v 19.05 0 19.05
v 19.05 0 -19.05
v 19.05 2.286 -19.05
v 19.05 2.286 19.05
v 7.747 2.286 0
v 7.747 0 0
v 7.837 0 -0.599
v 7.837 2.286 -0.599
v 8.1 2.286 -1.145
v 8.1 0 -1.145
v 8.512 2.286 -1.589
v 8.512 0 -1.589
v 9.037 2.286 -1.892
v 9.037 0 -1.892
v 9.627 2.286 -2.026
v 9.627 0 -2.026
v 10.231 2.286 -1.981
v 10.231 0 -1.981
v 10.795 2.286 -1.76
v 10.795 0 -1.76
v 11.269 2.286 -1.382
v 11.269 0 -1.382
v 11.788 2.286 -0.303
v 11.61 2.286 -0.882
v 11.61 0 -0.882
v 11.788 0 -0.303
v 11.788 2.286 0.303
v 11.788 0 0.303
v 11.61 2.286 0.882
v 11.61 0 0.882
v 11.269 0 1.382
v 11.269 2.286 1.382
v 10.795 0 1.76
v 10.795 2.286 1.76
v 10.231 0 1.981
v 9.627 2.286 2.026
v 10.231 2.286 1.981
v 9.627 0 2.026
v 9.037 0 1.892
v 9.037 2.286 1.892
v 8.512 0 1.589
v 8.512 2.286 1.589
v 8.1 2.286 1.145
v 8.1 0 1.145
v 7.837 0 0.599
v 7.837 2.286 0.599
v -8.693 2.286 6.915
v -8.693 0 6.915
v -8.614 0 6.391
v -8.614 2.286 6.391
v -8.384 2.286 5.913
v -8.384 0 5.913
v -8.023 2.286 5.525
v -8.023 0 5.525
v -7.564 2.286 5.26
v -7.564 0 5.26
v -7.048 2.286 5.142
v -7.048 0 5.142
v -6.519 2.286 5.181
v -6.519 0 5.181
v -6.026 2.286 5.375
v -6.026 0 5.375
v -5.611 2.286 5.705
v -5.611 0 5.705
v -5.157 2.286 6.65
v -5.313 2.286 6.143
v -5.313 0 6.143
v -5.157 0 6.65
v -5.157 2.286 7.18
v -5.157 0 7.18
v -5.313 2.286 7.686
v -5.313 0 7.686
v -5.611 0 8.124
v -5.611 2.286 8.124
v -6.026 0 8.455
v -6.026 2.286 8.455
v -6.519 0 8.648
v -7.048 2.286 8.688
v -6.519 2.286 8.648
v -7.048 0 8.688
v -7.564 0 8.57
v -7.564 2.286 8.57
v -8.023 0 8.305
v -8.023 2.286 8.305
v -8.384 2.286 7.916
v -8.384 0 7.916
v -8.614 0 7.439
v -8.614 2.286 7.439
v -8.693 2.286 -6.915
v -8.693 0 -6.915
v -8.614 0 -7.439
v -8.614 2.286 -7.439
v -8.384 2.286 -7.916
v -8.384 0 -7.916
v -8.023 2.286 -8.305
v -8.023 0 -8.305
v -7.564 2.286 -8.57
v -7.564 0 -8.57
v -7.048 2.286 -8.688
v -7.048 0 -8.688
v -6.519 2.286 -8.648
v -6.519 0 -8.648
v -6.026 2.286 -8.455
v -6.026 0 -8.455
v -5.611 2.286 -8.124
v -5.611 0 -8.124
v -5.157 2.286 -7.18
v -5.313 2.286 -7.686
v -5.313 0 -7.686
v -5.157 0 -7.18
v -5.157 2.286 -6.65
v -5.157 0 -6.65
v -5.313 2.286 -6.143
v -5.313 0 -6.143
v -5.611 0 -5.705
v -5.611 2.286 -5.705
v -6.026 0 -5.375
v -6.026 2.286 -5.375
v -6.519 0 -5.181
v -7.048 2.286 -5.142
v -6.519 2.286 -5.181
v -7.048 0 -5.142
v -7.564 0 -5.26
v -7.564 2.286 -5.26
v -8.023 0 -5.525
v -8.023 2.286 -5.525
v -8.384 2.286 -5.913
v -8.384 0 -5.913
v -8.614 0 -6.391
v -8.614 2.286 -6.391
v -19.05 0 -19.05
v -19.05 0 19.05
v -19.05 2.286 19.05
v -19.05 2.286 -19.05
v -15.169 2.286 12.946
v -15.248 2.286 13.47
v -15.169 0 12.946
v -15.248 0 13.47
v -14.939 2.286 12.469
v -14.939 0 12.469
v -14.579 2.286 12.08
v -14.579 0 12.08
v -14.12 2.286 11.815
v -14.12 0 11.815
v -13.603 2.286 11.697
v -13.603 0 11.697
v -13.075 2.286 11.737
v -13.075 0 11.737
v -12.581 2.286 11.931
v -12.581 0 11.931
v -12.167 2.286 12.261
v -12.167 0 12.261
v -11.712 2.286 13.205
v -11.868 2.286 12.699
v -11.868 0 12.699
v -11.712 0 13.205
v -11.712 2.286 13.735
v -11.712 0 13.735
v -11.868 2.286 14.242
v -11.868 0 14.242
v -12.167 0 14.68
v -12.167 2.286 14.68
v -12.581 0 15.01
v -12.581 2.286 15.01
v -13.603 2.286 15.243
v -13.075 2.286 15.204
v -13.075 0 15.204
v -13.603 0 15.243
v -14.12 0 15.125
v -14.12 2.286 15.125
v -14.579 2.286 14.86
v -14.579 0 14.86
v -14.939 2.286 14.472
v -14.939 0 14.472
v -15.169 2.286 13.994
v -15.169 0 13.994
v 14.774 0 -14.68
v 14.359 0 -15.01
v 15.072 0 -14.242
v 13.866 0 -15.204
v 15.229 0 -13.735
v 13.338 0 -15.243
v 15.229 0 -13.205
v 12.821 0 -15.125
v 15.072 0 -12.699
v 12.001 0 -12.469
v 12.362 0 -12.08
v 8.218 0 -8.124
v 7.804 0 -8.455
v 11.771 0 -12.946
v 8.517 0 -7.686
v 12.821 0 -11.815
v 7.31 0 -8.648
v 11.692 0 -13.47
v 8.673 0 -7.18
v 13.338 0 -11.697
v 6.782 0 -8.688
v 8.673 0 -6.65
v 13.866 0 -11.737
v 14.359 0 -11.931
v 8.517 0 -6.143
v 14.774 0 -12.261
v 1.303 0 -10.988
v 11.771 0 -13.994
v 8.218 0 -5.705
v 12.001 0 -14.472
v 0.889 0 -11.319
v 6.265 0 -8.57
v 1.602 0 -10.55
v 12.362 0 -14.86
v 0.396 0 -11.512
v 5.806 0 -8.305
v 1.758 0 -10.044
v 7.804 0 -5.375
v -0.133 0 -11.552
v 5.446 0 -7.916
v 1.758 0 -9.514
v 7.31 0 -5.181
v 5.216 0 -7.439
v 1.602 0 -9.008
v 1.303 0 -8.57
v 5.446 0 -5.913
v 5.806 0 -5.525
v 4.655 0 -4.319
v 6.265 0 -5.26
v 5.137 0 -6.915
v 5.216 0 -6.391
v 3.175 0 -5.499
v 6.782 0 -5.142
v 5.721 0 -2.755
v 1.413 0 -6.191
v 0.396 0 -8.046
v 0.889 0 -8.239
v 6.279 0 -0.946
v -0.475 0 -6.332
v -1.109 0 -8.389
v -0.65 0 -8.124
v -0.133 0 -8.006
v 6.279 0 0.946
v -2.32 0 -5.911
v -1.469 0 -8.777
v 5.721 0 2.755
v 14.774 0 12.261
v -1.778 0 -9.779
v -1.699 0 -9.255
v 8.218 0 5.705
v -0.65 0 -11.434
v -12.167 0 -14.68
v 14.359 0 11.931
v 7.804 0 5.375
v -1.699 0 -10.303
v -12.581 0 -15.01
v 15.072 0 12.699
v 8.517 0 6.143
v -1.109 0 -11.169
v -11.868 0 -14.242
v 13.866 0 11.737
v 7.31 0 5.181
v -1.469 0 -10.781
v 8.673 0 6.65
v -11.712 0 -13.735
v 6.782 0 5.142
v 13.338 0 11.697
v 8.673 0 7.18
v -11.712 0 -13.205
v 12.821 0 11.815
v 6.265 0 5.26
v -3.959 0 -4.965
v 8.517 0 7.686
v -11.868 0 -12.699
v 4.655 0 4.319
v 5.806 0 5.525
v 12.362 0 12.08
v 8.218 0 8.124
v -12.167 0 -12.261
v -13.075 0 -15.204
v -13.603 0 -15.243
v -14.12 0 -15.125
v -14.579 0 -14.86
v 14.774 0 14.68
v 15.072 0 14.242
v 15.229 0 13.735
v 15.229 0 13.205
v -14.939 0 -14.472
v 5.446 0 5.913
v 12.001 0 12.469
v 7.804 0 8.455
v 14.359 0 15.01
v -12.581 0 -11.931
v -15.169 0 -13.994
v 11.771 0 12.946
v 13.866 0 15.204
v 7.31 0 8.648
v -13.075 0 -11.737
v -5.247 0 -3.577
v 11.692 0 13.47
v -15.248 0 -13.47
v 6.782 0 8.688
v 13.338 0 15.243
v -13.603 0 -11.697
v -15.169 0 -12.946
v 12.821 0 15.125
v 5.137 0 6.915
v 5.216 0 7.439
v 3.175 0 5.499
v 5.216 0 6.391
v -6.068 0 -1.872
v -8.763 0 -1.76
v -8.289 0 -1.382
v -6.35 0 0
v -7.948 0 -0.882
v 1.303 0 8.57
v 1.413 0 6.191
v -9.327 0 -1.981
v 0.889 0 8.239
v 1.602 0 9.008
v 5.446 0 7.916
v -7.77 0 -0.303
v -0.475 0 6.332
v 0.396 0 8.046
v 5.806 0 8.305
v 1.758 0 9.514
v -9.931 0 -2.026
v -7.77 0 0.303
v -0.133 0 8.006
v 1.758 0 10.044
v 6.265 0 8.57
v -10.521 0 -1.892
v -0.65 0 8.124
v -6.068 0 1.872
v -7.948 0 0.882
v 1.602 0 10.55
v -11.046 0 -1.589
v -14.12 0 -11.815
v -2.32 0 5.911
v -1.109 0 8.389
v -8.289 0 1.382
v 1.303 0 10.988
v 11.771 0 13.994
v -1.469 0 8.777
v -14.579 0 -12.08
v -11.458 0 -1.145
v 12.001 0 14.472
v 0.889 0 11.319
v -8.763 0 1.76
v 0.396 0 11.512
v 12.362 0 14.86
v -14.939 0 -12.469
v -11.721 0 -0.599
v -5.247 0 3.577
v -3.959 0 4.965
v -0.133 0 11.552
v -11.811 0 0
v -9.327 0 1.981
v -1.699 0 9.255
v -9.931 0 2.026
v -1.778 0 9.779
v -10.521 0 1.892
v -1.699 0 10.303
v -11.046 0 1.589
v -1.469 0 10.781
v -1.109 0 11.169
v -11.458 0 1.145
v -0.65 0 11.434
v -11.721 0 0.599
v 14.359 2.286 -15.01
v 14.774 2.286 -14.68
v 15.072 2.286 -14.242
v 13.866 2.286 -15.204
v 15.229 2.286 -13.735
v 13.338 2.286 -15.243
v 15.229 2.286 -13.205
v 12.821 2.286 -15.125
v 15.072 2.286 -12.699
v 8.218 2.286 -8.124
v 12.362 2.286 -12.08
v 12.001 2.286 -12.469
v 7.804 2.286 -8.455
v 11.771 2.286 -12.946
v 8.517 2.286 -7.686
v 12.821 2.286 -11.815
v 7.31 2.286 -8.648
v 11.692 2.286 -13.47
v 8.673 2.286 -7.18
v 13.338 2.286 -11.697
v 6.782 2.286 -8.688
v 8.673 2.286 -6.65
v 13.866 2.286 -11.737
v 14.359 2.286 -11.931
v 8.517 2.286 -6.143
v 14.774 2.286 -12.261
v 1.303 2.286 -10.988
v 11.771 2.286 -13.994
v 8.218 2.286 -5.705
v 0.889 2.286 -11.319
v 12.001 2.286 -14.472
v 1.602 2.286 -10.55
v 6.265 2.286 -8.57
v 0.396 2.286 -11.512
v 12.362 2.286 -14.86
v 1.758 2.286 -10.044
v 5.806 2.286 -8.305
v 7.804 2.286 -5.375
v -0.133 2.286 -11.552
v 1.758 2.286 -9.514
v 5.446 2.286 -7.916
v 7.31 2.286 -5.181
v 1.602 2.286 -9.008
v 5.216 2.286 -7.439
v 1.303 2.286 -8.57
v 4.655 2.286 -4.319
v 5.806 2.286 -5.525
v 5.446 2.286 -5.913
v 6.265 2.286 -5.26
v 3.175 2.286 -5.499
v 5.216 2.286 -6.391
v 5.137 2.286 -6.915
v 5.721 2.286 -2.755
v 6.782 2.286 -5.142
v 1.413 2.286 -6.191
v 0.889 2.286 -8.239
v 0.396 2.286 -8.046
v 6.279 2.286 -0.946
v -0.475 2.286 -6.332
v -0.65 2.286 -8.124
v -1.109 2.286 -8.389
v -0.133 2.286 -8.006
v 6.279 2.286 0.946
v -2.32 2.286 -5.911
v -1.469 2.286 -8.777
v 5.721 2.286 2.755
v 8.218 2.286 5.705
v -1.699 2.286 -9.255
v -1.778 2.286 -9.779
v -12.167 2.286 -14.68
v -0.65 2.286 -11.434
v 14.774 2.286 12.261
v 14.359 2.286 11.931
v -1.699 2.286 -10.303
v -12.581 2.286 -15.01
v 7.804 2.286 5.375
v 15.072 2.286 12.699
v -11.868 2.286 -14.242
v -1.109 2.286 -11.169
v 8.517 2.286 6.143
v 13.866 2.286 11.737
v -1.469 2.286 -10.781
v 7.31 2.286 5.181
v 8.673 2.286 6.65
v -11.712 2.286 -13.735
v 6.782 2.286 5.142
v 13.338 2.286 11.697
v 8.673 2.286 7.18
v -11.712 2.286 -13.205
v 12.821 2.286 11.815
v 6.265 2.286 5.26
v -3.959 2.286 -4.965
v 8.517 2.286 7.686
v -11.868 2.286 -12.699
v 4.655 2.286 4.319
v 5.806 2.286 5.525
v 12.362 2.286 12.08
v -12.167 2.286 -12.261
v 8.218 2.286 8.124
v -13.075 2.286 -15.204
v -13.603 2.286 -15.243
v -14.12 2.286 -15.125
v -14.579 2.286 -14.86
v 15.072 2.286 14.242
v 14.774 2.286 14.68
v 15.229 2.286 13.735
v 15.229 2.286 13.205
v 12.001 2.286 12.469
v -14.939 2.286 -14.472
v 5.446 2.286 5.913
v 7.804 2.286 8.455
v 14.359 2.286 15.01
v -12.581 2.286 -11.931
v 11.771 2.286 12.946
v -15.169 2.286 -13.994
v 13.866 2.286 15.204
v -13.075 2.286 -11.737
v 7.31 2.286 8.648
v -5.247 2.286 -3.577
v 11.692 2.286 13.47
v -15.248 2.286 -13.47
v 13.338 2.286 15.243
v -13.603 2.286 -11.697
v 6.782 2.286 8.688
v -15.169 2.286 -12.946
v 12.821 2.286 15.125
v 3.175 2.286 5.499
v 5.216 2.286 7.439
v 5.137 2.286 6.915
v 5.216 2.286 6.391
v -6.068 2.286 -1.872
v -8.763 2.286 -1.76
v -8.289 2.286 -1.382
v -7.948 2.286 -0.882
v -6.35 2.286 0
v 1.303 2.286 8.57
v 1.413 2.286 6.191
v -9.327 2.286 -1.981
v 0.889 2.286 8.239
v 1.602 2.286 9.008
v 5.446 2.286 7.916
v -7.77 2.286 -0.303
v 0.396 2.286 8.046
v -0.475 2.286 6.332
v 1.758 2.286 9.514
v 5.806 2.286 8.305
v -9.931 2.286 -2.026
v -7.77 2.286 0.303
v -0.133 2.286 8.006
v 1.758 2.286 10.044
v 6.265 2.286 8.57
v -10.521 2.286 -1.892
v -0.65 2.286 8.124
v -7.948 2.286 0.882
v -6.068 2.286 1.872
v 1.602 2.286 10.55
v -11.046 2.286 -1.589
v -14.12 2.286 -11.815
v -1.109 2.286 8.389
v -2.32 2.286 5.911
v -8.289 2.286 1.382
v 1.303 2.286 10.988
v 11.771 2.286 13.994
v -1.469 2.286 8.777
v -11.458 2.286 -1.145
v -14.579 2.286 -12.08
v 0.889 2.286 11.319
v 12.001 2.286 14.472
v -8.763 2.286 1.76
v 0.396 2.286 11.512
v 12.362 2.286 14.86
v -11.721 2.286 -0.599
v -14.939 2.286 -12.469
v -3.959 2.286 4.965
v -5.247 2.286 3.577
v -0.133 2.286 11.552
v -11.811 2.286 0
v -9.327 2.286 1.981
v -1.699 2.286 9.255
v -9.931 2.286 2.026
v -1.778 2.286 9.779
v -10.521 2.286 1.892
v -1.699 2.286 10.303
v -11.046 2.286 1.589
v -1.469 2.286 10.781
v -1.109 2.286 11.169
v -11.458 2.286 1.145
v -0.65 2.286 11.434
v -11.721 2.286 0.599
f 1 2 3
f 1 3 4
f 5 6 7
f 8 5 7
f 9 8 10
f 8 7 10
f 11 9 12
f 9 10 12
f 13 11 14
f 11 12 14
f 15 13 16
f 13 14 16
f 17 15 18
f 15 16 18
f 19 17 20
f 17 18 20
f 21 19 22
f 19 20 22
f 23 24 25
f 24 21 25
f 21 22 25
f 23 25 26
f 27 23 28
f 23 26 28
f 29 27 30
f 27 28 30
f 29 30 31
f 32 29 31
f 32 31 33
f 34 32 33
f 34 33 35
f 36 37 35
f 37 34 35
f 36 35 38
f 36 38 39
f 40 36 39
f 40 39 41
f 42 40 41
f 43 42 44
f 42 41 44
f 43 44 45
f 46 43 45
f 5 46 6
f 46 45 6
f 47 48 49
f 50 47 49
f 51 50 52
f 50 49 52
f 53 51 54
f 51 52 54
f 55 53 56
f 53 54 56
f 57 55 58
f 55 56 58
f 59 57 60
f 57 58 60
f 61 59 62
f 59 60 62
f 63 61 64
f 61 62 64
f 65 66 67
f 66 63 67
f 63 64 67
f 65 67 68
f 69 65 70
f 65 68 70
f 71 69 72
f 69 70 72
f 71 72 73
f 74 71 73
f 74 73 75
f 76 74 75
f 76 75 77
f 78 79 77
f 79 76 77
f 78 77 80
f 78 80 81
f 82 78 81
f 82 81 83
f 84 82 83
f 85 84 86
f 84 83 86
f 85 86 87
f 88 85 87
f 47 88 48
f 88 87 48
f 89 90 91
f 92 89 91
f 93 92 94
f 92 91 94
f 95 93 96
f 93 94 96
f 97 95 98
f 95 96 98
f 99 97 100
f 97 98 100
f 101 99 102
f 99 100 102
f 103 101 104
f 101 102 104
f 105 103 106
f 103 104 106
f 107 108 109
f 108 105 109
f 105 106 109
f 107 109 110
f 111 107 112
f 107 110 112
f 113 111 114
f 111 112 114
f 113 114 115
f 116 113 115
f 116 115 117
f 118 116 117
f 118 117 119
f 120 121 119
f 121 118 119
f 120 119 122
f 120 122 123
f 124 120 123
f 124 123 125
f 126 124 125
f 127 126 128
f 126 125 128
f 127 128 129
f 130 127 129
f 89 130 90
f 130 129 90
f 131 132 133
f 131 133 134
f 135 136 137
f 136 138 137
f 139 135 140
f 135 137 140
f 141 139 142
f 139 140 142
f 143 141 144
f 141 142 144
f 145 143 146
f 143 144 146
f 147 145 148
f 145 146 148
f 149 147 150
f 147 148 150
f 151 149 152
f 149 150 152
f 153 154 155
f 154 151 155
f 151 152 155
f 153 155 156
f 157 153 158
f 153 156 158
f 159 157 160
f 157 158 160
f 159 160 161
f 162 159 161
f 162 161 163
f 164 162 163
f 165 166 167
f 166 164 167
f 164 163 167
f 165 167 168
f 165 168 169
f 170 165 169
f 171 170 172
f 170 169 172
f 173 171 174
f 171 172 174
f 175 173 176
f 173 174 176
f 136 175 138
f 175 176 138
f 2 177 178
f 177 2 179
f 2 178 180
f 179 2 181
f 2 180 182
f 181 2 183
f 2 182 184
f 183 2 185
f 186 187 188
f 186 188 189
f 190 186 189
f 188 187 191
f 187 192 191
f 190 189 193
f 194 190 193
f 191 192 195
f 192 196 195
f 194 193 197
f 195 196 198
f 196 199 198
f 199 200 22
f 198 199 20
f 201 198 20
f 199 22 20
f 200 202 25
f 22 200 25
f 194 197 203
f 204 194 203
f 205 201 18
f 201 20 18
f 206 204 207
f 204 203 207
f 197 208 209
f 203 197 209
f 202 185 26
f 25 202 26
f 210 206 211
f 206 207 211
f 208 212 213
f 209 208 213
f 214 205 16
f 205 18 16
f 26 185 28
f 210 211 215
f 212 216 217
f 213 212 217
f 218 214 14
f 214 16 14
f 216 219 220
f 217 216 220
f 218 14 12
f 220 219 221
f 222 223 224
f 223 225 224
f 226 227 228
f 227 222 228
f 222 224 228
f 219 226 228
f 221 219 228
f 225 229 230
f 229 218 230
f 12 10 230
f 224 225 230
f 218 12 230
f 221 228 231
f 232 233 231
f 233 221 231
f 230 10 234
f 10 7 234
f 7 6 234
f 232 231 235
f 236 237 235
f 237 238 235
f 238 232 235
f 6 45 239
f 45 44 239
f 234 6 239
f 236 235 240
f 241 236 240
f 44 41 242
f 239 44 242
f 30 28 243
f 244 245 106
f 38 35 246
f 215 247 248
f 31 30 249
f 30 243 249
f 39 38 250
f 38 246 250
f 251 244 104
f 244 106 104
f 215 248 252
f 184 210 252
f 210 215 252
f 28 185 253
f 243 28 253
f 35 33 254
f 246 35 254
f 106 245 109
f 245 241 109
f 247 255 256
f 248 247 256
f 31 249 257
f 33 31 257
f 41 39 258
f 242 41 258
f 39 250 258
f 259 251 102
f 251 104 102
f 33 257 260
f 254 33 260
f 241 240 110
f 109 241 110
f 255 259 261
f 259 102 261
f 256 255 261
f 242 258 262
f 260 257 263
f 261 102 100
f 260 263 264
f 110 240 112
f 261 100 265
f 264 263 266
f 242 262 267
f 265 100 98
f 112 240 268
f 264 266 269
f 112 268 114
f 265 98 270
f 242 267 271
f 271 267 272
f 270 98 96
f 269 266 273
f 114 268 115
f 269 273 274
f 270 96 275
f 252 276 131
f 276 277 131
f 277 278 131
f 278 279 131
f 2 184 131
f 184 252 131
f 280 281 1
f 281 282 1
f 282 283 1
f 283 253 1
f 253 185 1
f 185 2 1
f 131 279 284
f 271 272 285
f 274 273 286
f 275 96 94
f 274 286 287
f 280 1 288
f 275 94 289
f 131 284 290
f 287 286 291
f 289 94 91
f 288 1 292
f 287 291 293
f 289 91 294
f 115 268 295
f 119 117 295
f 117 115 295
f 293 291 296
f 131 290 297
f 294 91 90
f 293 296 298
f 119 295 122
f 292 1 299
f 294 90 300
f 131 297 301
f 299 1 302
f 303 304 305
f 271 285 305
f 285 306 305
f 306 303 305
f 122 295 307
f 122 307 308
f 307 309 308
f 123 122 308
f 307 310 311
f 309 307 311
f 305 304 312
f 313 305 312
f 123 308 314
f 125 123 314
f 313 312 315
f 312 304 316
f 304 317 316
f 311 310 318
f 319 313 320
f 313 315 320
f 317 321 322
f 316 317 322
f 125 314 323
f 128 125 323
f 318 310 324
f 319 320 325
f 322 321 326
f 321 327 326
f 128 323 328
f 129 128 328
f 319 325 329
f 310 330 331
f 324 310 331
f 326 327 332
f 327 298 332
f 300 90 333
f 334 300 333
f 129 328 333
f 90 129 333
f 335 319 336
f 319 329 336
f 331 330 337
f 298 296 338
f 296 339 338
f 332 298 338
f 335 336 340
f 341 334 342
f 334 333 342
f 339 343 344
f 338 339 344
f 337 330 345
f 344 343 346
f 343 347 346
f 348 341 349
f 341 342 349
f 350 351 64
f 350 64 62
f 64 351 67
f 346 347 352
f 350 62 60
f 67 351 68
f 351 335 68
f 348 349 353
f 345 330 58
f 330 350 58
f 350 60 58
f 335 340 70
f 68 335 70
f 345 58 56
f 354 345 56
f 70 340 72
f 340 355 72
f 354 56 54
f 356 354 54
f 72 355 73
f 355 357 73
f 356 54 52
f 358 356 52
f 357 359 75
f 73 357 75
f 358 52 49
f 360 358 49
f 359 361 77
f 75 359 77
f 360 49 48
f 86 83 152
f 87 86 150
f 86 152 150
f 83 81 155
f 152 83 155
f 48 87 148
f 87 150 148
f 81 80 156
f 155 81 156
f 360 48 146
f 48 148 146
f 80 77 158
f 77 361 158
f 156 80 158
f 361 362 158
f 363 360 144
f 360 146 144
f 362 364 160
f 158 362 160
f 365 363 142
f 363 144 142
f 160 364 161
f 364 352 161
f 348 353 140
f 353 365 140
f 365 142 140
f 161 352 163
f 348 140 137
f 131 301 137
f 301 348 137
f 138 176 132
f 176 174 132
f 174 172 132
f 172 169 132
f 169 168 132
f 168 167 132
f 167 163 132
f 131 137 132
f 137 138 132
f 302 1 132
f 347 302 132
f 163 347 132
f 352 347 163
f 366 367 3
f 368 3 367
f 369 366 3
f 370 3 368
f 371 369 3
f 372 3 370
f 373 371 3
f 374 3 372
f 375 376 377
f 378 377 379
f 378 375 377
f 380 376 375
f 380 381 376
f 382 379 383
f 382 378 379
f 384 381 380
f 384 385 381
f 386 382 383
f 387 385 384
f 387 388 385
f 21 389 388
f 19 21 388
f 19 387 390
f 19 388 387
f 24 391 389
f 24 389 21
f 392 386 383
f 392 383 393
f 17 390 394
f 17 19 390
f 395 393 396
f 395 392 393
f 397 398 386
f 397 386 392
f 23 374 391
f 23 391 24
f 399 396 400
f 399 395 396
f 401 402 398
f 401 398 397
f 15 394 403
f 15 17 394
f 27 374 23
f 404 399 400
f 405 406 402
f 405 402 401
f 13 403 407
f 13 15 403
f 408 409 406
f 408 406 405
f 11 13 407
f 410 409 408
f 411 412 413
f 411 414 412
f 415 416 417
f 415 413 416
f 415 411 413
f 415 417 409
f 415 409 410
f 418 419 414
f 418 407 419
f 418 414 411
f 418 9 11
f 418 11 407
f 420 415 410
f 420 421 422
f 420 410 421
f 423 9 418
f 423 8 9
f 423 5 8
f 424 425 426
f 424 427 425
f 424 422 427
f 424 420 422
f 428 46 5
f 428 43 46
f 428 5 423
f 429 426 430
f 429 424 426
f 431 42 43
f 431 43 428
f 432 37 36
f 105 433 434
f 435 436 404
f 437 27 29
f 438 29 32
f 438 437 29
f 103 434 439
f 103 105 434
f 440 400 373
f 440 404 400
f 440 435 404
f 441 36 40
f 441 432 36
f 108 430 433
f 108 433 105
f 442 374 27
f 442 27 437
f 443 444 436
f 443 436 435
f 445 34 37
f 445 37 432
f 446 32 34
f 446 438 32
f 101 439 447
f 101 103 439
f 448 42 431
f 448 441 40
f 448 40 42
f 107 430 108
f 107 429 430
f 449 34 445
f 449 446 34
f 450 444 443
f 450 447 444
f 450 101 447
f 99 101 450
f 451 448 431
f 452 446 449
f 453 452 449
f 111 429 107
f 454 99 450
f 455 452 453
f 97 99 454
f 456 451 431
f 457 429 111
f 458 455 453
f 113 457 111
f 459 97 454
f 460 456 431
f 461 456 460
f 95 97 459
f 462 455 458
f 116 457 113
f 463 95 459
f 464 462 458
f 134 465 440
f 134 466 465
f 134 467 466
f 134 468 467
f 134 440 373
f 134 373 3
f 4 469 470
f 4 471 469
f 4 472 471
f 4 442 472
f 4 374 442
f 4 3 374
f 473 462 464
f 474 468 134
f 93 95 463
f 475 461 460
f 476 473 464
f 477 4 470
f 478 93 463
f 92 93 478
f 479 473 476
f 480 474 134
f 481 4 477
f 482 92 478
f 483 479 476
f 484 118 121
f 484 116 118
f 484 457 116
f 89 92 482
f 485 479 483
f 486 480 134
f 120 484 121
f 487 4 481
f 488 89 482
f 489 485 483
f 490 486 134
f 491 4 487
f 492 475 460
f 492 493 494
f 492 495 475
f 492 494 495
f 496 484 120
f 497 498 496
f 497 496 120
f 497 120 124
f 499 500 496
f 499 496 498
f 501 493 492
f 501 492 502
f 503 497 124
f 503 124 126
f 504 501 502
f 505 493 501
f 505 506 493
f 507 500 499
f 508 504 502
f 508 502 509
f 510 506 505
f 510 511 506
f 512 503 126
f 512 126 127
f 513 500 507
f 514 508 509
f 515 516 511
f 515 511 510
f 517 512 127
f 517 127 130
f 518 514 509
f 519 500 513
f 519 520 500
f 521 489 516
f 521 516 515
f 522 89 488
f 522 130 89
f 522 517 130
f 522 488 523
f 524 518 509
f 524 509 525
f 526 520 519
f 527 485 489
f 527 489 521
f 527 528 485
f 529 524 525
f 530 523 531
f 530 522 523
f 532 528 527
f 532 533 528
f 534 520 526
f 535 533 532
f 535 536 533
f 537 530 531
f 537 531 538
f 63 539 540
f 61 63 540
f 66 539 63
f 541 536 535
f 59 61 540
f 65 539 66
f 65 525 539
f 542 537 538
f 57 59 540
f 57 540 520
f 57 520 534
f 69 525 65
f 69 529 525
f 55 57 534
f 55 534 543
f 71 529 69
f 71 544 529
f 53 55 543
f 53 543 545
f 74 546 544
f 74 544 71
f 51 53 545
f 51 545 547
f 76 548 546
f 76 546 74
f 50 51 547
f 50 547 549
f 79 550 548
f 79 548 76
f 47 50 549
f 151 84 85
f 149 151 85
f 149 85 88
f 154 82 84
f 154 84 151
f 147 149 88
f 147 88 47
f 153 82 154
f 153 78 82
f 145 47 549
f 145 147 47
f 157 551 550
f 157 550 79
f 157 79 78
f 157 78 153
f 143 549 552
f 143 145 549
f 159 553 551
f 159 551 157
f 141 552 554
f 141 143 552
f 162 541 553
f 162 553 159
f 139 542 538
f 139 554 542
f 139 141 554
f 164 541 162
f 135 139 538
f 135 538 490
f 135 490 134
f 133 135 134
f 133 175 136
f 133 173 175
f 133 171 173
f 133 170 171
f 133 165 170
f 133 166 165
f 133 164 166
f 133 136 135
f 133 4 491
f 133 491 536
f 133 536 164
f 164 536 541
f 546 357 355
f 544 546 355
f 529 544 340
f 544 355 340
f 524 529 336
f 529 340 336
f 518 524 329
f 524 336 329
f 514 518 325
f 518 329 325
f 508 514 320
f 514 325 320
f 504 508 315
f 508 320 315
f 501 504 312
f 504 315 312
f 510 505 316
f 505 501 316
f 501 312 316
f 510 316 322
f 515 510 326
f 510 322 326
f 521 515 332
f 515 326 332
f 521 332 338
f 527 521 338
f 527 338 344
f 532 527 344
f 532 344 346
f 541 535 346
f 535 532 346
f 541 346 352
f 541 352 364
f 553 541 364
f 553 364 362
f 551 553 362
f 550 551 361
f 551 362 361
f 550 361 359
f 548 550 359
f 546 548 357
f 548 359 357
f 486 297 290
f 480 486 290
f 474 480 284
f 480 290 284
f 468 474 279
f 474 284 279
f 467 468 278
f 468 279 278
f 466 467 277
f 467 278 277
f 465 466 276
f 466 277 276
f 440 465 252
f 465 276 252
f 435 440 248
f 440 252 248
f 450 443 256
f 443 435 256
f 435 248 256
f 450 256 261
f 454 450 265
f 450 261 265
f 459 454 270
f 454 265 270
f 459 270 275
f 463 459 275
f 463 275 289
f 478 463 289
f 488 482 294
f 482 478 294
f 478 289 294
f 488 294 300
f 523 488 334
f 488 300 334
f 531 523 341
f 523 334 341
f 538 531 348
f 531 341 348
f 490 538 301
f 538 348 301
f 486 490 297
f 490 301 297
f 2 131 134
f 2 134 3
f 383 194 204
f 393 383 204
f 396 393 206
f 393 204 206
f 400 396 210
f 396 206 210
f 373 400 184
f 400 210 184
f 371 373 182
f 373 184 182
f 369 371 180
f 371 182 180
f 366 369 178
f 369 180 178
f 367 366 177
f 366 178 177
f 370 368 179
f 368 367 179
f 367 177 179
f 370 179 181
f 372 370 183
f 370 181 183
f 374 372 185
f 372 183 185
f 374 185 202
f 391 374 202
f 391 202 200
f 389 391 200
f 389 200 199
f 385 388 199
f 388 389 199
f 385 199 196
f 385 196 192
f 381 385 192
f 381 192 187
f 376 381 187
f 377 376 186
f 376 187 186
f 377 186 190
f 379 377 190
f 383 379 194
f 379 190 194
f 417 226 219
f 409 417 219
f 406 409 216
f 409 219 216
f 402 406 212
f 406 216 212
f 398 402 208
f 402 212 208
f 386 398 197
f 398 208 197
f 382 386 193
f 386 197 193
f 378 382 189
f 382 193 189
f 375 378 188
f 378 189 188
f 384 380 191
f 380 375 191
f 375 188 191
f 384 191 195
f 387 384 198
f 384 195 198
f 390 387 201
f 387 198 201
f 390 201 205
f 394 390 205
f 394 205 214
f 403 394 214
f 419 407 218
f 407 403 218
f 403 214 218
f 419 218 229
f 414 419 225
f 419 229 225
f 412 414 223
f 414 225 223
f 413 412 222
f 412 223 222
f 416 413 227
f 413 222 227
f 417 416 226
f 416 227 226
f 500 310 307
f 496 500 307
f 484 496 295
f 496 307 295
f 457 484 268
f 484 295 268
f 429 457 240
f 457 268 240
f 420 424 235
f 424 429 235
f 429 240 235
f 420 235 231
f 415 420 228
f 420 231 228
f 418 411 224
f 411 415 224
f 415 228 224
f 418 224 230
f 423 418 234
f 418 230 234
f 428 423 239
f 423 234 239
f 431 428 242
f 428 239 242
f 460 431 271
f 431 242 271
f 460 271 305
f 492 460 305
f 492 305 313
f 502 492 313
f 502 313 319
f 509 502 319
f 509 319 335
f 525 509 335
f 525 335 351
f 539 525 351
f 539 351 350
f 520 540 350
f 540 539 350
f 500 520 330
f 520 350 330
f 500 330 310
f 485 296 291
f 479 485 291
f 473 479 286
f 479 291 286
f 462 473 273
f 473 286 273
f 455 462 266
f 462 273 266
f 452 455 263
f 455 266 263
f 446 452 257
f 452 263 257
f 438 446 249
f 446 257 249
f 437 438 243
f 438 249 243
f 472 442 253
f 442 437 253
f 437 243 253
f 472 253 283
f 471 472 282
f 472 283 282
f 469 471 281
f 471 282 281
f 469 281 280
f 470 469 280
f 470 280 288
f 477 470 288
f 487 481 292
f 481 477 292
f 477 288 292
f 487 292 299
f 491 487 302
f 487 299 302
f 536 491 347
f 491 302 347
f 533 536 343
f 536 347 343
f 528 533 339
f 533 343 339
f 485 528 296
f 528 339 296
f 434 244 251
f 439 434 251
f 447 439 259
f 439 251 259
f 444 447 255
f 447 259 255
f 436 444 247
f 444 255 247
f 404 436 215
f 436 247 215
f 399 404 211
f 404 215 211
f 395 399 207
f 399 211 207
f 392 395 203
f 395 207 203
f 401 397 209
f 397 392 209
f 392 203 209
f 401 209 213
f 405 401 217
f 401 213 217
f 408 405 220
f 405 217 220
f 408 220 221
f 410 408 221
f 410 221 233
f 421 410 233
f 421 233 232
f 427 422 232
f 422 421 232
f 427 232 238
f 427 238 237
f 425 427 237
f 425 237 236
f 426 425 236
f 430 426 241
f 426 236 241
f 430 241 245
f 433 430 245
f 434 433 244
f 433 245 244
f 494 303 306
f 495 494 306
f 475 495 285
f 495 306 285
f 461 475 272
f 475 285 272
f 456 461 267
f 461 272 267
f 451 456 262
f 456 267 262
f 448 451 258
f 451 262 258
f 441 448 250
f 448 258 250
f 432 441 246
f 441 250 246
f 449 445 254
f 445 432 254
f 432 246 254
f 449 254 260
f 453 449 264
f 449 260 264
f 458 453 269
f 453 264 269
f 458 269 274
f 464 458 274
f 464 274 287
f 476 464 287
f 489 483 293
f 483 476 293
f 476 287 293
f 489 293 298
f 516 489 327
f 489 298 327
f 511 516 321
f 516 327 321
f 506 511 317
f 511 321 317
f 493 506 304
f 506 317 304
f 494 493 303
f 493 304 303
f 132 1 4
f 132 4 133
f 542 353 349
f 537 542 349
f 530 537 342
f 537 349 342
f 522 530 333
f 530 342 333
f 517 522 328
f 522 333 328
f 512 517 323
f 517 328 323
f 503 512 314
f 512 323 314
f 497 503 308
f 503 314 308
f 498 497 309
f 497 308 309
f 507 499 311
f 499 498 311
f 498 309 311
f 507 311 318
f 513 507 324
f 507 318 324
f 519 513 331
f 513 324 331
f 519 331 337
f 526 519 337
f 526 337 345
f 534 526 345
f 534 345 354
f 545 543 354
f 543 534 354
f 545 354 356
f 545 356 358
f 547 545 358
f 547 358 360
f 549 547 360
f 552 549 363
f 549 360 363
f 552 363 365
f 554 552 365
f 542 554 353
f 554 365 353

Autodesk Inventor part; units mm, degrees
ref_plane "YZ Plane" through (0, 0, 0) normal (1, 0, 0) x (0, 1, 0)
ref_plane "XZ Plane" through (0, 0, 0) normal (0, 1, 0) x (-1, 0, 0)
ref_plane "XY Plane" through (0, 0, 0) normal (0, 0, 1) x (1, 0, 0)
sketch "Sketch1" plane through (0, 0, 0) normal (0, 1, 0) x (-1, 0, 0)
  line L0 (-19.05, 19.05) -> (19.05, 19.05)
  line L1 (19.05, 19.05) -> (19.05, -19.05)
  line L2 (19.05, -19.05) -> (-19.05, -19.05)
  line L3 (-19.05, -19.05) -> (-19.05, 19.05)
  circle A0 centre (0, 0) radius 6.35
  circle A1 centre (0, 0) radius 19.05 construction
  circle A2 centre (0, 0) radius 9.779 construction
  line L4 (19.05, -19.05) -> (-19.05, 19.05) construction
  line L5 (19.05, 19.05) -> (-19.05, -19.05) construction
  circle A3 centre (0, -9.779) radius 1.778
  circle A4 centre (6.9148, -6.9148) radius 1.778
  circle A5 centre (-6.9148, -6.9148) radius 1.778
  circle A6 centre (-6.9148, 6.9148) radius 1.778
  circle A7 centre (0, 9.779) radius 1.778
  circle A8 centre (6.9148, 6.9148) radius 1.778
  circle A9 centre (-9.779, 0) radius 2.032
  circle A10 centre (9.779, 0) radius 2.032
  circle A11 centre (-13.4704, 13.4704) radius 1.778
  circle A12 centre (13.4704, 13.4704) radius 1.778
  circle A13 centre (13.4704, -13.4704) radius 1.778
  circle A14 centre (-13.4704, -13.4704) radius 1.778
  dimension "d5" = 19.558
  dimension "d0" = 19.05
  dimension "d1" = 38.1
  dimension "d2" = 38.1
  dimension "d3" = 19.05
  dimension "d4" = 12.7
  dimension "d6" = 3.556
  dimension "d7" = 3.556
  dimension "d8" = 3.556
  dimension "d9" = 3.556
  dimension "d10" = 3.556
  dimension "d11" = 3.556
  dimension "d12" = 4.064
  dimension "d13" = 4.064
  dimension "d14" = 3.556
  dimension "d15" = 3.556
  dimension "d16" = 3.556
  dimension "d17" = 3.556
extrude "Extrusion1" add sketch "Sketch1" along normal blind 2.286
sketch "Sketch2" plane through (-19.05, 0, -19.05) normal (-1, 0, 0) x (0, 0, 1)
  line L0 (38.1, 0) -> (0, 0) projected
  line L1 (38.1, 0) -> (38.1, 2.286) projected
  line L2 (0, 2.286) -> (38.1, 2.286) projected
  line L3 (0, 0) -> (0, 2.286) projected
  circle A0 centre (46.9646, 57.15) radius 6.35
  line L4 (46.9646, 57.15) -> (0, 10.1854) construction
  line L5 (46.9646, 57.15) -> (113.3826, 57.15) construction
  circle A1 centre (33.4942, 43.6796) radius 6.35
  circle A2 centre (20.0238, 30.2092) radius 6.35
  circle A3 centre (46.9646, 57.15) radius 9.779 construction
  circle A4 centre (46.9646, 57.15) radius 19.05 construction
  line L6 (42.4745, 52.6599) -> (60.435, 70.6204) construction
  line L7 (46.9646, 57.15) -> (60.4393, 57.15) construction
  line L8 (60.435, 43.6796) -> (33.4942, 70.6204) construction
  line L9 (46.9646, 57.15) -> (60.4393, 57.15) construction
  line L10 (27.9146, 57.15) -> (66.0146, 57.15) construction
  circle A5 centre (40.0498, 64.0648) radius 1.778
  circle A6 centre (46.9646, 66.929) radius 1.778
  circle A7 centre (37.1856, 57.15) radius 1.778
  circle A8 centre (46.9646, 47.371) radius 1.778
  circle A9 centre (53.8794, 50.2352) radius 1.778
  circle A10 centre (56.7436, 57.15) radius 1.778
  circle A11 centre (53.8794, 64.0648) radius 2.032
  circle A12 centre (40.0498, 50.2352) radius 2.032
  circle A13 centre (46.9646, 76.2) radius 1.778
  circle A14 centre (27.9146, 57.15) radius 1.778
  circle A15 centre (46.9646, 38.1) radius 1.778
  circle A16 centre (66.0146, 57.15) radius 1.778
  point P0 (19.05, 0)
  dimension "d20" = 12.7
  dimension "d28" = 19.558
  dimension "d29" = 38.1
  dimension "d21" = 57.15
  dimension "d22" = 46.9646
  dimension "d23" = 135
  dimension "d24" = 12.7
  dimension "d25" = 19.05
  dimension "d26" = 12.7
  dimension "d27" = 19.05
  dimension "d30" = 45
  dimension "d31" = 135
  dimension "d32" = 3.556
  dimension "d33" = 3.556
  dimension "d34" = 3.556
  dimension "d35" = 3.556
  dimension "d36" = 3.556
  dimension "d37" = 3.556
  dimension "d38" = 4.064
  dimension "d39" = 4.064
  dimension "d40" = 3.556
  dimension "d41" = 3.556
  dimension "d42" = 3.556
  dimension "d43" = 3.556
properties part number "Channel Bracket B"
